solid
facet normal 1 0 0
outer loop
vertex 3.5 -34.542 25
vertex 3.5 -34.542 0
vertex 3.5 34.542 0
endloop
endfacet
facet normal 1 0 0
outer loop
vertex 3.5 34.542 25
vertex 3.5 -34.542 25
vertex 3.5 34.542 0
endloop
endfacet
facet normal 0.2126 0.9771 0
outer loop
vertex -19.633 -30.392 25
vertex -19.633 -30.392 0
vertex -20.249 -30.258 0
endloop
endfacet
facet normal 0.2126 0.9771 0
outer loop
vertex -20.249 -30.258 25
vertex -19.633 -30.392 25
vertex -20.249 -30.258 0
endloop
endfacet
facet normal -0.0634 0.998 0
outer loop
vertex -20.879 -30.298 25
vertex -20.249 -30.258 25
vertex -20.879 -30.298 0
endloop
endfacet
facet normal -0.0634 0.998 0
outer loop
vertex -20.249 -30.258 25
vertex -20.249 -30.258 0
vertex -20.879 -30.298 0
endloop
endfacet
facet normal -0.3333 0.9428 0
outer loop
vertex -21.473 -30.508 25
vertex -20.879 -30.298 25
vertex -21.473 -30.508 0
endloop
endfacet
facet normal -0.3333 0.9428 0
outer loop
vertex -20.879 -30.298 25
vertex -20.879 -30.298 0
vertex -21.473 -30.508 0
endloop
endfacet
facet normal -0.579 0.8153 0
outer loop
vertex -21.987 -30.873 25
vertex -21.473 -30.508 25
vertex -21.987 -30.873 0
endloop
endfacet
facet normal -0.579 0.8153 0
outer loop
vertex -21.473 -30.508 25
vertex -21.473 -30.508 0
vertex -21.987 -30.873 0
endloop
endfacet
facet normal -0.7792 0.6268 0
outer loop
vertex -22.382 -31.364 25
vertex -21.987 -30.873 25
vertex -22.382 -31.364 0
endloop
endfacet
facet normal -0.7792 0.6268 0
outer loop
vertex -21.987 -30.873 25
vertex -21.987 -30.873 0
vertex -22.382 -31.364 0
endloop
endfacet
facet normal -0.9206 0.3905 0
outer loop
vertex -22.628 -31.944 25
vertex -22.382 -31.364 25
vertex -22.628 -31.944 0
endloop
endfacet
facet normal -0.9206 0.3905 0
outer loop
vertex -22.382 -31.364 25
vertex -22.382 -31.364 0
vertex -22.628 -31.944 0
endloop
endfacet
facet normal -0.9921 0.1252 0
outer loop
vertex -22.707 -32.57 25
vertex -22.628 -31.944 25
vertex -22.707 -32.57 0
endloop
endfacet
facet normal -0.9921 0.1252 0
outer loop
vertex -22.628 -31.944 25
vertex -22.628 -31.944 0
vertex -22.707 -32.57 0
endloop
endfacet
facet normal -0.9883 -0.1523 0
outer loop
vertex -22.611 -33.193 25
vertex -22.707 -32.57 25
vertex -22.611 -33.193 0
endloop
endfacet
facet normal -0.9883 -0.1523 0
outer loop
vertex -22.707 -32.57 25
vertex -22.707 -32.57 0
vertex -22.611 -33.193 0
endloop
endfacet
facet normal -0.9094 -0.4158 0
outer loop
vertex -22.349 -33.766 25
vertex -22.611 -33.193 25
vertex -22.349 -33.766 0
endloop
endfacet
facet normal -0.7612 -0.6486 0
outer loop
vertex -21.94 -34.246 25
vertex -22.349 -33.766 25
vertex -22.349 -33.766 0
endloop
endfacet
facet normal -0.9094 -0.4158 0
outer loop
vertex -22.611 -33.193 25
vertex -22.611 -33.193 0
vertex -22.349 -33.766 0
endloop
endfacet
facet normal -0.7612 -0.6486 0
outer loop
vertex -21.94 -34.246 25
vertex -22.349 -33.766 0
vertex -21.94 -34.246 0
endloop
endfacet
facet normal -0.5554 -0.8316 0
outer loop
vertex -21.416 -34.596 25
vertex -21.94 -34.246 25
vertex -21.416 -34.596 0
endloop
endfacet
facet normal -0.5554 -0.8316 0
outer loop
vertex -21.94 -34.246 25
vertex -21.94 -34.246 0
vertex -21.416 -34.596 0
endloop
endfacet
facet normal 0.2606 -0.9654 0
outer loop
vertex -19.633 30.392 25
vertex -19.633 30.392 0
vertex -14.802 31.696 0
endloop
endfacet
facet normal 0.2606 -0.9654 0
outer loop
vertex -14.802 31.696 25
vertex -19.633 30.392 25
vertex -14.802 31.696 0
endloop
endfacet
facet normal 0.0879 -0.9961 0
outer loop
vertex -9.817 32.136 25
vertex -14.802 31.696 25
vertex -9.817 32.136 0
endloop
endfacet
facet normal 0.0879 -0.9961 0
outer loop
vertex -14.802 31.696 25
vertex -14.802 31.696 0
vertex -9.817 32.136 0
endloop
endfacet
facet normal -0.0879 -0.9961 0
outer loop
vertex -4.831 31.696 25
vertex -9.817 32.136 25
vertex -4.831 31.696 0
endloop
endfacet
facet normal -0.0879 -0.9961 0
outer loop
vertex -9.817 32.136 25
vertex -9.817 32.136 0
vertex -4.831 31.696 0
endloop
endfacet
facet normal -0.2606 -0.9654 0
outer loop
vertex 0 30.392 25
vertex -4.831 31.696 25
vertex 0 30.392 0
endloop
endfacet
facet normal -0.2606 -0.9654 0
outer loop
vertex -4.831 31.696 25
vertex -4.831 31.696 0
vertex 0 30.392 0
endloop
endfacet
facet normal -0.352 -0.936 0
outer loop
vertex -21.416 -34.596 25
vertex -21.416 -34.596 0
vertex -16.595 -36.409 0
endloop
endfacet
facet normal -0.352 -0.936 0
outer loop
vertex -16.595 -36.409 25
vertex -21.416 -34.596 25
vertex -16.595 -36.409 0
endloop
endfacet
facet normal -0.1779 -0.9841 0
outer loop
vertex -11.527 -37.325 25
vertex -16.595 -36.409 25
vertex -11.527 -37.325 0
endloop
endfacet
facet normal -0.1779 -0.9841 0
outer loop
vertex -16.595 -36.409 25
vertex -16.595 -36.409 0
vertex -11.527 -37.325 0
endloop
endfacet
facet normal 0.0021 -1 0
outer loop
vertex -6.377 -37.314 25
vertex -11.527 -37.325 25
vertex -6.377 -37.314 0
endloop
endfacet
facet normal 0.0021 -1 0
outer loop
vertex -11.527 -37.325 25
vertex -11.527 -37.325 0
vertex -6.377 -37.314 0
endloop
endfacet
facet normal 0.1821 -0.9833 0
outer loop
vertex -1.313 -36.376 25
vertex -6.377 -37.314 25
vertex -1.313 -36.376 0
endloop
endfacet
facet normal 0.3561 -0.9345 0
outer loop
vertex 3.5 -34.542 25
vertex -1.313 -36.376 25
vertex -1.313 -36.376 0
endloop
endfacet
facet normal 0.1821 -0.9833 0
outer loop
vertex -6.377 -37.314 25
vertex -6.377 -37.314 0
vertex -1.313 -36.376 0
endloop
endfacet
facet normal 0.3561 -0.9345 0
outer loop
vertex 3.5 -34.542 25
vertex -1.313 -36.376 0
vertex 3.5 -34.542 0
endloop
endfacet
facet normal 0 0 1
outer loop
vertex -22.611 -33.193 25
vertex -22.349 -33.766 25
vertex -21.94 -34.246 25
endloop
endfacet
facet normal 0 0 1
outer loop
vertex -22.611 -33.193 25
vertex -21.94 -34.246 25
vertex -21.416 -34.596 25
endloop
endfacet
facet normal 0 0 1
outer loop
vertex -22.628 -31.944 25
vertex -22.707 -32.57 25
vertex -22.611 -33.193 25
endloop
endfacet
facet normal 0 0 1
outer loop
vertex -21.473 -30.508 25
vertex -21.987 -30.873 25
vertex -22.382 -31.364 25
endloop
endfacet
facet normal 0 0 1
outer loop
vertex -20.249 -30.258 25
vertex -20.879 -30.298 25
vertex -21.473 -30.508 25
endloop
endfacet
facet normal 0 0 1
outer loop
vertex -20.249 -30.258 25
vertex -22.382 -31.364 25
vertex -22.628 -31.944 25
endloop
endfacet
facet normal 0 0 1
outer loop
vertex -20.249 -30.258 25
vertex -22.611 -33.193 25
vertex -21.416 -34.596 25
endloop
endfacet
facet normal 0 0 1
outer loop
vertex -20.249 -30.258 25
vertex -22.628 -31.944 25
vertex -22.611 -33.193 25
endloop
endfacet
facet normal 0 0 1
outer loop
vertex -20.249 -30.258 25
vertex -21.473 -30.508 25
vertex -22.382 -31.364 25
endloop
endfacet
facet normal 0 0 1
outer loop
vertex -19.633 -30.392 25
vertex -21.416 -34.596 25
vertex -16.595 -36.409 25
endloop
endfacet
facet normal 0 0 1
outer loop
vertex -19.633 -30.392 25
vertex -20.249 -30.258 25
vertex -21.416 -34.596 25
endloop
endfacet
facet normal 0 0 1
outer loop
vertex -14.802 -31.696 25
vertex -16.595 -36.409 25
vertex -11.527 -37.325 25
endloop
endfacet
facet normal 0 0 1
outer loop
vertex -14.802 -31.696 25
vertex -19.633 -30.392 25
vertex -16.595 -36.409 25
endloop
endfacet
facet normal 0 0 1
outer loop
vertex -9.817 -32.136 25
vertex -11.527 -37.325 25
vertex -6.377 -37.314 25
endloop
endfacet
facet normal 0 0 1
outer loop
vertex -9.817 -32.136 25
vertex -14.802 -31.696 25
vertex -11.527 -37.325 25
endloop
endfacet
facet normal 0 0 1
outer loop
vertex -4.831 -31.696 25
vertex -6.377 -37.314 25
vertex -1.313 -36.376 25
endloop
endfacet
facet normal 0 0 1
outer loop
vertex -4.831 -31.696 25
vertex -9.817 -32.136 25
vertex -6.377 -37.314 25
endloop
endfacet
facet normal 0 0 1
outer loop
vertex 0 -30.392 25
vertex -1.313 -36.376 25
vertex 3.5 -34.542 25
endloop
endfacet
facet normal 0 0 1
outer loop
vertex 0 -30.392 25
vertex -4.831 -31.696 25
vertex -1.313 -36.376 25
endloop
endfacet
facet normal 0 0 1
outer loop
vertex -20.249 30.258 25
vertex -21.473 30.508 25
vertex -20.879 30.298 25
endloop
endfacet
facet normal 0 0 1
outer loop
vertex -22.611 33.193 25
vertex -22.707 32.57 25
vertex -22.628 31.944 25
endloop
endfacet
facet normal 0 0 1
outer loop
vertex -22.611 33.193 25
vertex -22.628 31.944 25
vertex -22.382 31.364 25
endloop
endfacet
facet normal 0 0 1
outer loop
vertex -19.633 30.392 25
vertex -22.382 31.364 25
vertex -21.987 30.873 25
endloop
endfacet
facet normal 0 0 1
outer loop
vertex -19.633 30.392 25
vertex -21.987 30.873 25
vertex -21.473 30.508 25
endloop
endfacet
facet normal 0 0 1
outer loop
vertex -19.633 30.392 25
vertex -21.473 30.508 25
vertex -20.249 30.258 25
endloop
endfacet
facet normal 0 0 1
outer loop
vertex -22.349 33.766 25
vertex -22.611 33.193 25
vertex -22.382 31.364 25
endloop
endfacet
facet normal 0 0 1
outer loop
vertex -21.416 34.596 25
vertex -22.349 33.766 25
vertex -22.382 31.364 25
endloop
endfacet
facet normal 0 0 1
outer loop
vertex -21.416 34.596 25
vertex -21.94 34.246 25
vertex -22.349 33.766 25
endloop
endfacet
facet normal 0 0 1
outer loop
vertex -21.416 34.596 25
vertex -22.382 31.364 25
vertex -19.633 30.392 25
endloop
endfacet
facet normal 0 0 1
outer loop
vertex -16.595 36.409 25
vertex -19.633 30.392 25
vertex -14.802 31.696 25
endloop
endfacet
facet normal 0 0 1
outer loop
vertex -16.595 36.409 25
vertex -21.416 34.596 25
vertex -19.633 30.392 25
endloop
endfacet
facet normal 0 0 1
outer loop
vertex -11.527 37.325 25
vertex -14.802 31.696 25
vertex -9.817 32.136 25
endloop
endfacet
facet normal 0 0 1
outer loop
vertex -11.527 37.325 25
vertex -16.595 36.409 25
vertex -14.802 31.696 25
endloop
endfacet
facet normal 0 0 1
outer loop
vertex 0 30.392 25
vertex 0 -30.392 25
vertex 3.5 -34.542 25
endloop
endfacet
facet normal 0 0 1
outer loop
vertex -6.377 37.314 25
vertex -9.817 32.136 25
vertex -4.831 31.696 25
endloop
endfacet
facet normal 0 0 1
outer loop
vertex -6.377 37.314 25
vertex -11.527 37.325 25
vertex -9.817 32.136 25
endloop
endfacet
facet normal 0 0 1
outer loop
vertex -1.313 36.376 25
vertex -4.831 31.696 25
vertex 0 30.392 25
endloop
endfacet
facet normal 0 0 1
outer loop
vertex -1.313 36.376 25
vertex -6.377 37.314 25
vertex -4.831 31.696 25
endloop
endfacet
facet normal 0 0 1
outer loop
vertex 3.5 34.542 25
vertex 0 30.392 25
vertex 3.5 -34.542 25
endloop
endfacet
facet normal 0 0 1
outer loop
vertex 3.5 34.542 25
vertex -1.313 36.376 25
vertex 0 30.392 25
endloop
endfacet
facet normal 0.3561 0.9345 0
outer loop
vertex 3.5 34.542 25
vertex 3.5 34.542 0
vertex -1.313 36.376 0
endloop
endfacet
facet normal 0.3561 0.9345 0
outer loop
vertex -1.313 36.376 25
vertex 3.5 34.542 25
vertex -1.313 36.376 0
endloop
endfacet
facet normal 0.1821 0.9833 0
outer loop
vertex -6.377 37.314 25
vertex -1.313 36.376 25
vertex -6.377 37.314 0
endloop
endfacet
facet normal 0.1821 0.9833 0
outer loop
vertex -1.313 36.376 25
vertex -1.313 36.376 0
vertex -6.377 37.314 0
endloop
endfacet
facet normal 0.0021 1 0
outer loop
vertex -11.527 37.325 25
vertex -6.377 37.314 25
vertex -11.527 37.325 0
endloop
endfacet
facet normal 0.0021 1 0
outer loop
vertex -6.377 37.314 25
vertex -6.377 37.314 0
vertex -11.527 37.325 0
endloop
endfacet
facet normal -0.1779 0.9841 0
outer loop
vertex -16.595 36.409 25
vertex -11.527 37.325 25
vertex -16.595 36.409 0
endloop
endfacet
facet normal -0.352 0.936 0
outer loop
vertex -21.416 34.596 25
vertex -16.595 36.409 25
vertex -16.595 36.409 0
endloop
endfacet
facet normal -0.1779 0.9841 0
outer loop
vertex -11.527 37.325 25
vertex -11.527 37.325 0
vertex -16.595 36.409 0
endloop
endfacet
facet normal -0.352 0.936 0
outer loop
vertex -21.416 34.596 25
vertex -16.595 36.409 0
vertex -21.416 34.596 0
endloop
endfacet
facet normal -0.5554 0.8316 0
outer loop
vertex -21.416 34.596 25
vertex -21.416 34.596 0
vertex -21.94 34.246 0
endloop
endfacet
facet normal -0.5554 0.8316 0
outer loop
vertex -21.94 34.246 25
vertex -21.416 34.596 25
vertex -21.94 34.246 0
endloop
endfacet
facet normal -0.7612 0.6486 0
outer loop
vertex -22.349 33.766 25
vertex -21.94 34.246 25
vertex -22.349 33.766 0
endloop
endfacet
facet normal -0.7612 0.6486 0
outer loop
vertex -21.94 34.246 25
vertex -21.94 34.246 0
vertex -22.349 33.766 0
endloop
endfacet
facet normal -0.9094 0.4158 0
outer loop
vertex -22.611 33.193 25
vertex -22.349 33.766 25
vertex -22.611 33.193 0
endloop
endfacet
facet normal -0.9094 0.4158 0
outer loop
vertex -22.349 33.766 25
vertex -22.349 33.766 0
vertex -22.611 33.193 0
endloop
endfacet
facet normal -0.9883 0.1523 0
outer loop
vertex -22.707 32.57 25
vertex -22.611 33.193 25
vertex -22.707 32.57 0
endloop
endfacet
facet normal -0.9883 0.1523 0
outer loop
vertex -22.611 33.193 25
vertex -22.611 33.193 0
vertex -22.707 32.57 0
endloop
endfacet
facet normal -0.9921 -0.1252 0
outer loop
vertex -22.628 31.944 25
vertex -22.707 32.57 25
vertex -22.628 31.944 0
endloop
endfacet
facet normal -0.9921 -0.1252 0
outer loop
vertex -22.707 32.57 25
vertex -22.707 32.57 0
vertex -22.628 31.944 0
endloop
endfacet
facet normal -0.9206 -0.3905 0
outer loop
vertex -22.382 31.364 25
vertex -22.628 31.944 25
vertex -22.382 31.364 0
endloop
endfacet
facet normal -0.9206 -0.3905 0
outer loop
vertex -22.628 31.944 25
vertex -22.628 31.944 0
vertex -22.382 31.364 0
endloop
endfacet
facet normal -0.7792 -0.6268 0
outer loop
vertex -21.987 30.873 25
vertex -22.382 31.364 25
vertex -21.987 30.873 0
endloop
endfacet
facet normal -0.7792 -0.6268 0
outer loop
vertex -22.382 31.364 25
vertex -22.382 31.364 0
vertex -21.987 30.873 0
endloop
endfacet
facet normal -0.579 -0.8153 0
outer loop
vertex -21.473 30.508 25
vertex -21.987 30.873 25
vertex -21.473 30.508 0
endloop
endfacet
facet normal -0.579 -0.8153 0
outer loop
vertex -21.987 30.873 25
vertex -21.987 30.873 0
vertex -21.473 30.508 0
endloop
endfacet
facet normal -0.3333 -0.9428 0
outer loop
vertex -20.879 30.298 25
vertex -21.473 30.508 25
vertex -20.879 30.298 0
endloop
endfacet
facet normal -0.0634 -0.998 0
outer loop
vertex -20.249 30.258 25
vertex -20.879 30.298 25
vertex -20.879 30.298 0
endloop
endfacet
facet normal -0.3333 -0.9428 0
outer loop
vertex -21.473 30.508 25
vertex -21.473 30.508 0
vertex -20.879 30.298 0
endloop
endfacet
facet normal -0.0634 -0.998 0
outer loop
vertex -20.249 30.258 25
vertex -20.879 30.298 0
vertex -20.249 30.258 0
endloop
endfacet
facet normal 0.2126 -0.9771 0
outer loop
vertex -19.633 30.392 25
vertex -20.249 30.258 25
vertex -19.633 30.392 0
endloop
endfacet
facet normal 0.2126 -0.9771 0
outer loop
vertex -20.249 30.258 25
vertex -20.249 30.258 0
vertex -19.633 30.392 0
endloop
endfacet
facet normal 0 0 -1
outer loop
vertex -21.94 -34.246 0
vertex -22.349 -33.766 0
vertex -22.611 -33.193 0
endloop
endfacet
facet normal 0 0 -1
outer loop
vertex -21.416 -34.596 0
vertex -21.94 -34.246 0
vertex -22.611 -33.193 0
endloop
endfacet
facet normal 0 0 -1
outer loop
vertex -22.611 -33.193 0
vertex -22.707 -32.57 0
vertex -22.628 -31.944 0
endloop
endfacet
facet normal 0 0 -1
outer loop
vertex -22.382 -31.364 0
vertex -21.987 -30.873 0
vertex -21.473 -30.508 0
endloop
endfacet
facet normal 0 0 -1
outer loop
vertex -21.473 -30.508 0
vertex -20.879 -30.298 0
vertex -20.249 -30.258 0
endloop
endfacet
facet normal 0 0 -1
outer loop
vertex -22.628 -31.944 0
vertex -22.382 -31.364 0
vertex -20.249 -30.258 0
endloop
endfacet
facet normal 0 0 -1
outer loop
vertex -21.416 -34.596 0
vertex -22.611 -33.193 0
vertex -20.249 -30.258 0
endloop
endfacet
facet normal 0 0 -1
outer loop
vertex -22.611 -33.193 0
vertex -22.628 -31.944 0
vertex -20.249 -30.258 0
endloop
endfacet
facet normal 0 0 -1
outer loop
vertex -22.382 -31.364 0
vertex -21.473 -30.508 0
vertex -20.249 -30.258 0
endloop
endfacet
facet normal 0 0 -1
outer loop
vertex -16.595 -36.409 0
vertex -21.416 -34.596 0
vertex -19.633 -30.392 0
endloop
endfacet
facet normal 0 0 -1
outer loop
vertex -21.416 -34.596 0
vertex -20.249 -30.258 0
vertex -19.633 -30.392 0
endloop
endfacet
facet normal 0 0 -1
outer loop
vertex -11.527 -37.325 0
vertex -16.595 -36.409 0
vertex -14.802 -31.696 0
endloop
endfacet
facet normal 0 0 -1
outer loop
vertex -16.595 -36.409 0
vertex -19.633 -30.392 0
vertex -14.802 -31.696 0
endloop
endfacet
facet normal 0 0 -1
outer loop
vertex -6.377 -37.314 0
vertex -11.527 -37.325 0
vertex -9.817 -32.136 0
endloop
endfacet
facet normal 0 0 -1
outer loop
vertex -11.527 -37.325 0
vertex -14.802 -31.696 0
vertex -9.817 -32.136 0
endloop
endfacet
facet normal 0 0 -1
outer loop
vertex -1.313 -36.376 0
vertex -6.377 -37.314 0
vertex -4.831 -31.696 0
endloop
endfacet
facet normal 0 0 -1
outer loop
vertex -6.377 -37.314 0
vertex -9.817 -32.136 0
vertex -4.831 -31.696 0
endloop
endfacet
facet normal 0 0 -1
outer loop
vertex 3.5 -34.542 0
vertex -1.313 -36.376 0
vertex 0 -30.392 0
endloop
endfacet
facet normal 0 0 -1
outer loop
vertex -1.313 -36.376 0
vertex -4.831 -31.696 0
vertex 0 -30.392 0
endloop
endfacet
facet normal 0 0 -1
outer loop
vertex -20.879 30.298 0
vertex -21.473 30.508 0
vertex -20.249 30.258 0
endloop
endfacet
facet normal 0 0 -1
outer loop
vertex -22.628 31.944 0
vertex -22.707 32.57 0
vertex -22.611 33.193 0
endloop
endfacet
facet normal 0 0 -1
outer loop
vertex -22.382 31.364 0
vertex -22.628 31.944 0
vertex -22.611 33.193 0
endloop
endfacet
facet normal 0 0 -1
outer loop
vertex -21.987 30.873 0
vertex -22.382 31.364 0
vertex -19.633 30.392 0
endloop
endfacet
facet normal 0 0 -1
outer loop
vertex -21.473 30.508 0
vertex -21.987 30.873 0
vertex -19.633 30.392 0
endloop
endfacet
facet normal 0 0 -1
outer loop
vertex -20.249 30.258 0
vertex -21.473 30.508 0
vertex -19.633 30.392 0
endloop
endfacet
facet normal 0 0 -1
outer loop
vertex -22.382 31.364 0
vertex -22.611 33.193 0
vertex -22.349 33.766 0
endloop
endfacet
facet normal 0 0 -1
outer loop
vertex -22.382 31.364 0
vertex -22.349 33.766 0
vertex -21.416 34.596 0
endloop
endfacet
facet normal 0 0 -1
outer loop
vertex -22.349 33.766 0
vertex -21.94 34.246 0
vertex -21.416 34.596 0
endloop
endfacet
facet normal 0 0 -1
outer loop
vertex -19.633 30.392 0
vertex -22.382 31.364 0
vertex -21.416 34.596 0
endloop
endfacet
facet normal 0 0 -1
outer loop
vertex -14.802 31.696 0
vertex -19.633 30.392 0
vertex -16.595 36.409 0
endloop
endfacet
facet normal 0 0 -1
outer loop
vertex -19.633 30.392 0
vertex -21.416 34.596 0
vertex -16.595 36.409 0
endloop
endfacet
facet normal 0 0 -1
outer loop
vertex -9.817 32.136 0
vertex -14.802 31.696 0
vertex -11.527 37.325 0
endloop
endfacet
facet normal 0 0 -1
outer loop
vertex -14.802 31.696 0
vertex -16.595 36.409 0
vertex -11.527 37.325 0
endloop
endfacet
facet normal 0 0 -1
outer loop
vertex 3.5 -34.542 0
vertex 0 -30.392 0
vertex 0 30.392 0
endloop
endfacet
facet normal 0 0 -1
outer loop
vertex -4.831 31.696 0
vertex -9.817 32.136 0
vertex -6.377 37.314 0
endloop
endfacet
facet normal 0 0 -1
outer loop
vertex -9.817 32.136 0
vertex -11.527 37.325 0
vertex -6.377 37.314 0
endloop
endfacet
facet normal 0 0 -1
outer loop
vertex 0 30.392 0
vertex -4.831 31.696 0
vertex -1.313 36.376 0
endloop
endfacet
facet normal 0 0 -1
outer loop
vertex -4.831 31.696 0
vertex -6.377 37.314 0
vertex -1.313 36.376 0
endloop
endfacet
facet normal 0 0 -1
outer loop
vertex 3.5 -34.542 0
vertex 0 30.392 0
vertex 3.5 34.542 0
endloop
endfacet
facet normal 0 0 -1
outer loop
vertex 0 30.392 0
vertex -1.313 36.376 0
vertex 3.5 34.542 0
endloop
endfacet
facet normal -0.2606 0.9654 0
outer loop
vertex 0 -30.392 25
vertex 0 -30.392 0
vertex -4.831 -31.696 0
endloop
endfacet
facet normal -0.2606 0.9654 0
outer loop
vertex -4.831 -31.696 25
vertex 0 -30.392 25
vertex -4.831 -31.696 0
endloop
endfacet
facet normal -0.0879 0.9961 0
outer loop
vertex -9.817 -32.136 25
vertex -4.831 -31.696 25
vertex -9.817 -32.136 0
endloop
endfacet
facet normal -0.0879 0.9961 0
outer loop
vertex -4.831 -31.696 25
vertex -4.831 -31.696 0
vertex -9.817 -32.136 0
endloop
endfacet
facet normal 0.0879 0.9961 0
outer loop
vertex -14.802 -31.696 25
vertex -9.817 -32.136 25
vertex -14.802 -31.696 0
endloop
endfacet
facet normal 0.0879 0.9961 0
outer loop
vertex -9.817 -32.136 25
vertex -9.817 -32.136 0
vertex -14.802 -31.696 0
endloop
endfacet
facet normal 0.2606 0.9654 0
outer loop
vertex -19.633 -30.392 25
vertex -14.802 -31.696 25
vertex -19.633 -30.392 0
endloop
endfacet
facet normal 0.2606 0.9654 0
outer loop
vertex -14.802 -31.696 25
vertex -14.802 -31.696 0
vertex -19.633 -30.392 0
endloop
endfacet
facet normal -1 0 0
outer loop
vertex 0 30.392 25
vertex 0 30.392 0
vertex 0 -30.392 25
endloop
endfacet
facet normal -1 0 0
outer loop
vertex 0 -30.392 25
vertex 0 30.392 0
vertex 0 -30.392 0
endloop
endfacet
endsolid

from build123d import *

# Parameters (mm, degrees)
F1_DEPTH = 25


with BuildPart() as f1:
    # F0 (on Top) → F1 (new body)
    with BuildSketch(Plane.XY):
        with BuildLine():
            ThreePointArc((-19.63329, 30.391514), (-9.816645, 32.135515), (0, 30.391514))
            Line((0, 30.391514), (0, -30.391514))
            ThreePointArc((0, -30.391514), (-9.816645, -32.135515), (-19.63329, -30.391514))
            ThreePointArc((-19.63329, -30.391514), (-22.525582, -31.645534), (-21.415574, -34.596093))
            ThreePointArc((-21.415574, -34.596093), (-8.951554, -37.435962), (3.5, -34.541927))
            Line((3.5, -34.541927), (3.5, 34.541927))
            ThreePointArc((3.5, 34.541927), (-8.951554, 37.435962), (-21.415574, 34.596093))
            ThreePointArc((-21.415574, 34.596093), (-22.525582, 31.645534), (-19.63329, 30.391514))
        make_face()
    extrude(amount=F1_DEPTH)


solid = f1.part
